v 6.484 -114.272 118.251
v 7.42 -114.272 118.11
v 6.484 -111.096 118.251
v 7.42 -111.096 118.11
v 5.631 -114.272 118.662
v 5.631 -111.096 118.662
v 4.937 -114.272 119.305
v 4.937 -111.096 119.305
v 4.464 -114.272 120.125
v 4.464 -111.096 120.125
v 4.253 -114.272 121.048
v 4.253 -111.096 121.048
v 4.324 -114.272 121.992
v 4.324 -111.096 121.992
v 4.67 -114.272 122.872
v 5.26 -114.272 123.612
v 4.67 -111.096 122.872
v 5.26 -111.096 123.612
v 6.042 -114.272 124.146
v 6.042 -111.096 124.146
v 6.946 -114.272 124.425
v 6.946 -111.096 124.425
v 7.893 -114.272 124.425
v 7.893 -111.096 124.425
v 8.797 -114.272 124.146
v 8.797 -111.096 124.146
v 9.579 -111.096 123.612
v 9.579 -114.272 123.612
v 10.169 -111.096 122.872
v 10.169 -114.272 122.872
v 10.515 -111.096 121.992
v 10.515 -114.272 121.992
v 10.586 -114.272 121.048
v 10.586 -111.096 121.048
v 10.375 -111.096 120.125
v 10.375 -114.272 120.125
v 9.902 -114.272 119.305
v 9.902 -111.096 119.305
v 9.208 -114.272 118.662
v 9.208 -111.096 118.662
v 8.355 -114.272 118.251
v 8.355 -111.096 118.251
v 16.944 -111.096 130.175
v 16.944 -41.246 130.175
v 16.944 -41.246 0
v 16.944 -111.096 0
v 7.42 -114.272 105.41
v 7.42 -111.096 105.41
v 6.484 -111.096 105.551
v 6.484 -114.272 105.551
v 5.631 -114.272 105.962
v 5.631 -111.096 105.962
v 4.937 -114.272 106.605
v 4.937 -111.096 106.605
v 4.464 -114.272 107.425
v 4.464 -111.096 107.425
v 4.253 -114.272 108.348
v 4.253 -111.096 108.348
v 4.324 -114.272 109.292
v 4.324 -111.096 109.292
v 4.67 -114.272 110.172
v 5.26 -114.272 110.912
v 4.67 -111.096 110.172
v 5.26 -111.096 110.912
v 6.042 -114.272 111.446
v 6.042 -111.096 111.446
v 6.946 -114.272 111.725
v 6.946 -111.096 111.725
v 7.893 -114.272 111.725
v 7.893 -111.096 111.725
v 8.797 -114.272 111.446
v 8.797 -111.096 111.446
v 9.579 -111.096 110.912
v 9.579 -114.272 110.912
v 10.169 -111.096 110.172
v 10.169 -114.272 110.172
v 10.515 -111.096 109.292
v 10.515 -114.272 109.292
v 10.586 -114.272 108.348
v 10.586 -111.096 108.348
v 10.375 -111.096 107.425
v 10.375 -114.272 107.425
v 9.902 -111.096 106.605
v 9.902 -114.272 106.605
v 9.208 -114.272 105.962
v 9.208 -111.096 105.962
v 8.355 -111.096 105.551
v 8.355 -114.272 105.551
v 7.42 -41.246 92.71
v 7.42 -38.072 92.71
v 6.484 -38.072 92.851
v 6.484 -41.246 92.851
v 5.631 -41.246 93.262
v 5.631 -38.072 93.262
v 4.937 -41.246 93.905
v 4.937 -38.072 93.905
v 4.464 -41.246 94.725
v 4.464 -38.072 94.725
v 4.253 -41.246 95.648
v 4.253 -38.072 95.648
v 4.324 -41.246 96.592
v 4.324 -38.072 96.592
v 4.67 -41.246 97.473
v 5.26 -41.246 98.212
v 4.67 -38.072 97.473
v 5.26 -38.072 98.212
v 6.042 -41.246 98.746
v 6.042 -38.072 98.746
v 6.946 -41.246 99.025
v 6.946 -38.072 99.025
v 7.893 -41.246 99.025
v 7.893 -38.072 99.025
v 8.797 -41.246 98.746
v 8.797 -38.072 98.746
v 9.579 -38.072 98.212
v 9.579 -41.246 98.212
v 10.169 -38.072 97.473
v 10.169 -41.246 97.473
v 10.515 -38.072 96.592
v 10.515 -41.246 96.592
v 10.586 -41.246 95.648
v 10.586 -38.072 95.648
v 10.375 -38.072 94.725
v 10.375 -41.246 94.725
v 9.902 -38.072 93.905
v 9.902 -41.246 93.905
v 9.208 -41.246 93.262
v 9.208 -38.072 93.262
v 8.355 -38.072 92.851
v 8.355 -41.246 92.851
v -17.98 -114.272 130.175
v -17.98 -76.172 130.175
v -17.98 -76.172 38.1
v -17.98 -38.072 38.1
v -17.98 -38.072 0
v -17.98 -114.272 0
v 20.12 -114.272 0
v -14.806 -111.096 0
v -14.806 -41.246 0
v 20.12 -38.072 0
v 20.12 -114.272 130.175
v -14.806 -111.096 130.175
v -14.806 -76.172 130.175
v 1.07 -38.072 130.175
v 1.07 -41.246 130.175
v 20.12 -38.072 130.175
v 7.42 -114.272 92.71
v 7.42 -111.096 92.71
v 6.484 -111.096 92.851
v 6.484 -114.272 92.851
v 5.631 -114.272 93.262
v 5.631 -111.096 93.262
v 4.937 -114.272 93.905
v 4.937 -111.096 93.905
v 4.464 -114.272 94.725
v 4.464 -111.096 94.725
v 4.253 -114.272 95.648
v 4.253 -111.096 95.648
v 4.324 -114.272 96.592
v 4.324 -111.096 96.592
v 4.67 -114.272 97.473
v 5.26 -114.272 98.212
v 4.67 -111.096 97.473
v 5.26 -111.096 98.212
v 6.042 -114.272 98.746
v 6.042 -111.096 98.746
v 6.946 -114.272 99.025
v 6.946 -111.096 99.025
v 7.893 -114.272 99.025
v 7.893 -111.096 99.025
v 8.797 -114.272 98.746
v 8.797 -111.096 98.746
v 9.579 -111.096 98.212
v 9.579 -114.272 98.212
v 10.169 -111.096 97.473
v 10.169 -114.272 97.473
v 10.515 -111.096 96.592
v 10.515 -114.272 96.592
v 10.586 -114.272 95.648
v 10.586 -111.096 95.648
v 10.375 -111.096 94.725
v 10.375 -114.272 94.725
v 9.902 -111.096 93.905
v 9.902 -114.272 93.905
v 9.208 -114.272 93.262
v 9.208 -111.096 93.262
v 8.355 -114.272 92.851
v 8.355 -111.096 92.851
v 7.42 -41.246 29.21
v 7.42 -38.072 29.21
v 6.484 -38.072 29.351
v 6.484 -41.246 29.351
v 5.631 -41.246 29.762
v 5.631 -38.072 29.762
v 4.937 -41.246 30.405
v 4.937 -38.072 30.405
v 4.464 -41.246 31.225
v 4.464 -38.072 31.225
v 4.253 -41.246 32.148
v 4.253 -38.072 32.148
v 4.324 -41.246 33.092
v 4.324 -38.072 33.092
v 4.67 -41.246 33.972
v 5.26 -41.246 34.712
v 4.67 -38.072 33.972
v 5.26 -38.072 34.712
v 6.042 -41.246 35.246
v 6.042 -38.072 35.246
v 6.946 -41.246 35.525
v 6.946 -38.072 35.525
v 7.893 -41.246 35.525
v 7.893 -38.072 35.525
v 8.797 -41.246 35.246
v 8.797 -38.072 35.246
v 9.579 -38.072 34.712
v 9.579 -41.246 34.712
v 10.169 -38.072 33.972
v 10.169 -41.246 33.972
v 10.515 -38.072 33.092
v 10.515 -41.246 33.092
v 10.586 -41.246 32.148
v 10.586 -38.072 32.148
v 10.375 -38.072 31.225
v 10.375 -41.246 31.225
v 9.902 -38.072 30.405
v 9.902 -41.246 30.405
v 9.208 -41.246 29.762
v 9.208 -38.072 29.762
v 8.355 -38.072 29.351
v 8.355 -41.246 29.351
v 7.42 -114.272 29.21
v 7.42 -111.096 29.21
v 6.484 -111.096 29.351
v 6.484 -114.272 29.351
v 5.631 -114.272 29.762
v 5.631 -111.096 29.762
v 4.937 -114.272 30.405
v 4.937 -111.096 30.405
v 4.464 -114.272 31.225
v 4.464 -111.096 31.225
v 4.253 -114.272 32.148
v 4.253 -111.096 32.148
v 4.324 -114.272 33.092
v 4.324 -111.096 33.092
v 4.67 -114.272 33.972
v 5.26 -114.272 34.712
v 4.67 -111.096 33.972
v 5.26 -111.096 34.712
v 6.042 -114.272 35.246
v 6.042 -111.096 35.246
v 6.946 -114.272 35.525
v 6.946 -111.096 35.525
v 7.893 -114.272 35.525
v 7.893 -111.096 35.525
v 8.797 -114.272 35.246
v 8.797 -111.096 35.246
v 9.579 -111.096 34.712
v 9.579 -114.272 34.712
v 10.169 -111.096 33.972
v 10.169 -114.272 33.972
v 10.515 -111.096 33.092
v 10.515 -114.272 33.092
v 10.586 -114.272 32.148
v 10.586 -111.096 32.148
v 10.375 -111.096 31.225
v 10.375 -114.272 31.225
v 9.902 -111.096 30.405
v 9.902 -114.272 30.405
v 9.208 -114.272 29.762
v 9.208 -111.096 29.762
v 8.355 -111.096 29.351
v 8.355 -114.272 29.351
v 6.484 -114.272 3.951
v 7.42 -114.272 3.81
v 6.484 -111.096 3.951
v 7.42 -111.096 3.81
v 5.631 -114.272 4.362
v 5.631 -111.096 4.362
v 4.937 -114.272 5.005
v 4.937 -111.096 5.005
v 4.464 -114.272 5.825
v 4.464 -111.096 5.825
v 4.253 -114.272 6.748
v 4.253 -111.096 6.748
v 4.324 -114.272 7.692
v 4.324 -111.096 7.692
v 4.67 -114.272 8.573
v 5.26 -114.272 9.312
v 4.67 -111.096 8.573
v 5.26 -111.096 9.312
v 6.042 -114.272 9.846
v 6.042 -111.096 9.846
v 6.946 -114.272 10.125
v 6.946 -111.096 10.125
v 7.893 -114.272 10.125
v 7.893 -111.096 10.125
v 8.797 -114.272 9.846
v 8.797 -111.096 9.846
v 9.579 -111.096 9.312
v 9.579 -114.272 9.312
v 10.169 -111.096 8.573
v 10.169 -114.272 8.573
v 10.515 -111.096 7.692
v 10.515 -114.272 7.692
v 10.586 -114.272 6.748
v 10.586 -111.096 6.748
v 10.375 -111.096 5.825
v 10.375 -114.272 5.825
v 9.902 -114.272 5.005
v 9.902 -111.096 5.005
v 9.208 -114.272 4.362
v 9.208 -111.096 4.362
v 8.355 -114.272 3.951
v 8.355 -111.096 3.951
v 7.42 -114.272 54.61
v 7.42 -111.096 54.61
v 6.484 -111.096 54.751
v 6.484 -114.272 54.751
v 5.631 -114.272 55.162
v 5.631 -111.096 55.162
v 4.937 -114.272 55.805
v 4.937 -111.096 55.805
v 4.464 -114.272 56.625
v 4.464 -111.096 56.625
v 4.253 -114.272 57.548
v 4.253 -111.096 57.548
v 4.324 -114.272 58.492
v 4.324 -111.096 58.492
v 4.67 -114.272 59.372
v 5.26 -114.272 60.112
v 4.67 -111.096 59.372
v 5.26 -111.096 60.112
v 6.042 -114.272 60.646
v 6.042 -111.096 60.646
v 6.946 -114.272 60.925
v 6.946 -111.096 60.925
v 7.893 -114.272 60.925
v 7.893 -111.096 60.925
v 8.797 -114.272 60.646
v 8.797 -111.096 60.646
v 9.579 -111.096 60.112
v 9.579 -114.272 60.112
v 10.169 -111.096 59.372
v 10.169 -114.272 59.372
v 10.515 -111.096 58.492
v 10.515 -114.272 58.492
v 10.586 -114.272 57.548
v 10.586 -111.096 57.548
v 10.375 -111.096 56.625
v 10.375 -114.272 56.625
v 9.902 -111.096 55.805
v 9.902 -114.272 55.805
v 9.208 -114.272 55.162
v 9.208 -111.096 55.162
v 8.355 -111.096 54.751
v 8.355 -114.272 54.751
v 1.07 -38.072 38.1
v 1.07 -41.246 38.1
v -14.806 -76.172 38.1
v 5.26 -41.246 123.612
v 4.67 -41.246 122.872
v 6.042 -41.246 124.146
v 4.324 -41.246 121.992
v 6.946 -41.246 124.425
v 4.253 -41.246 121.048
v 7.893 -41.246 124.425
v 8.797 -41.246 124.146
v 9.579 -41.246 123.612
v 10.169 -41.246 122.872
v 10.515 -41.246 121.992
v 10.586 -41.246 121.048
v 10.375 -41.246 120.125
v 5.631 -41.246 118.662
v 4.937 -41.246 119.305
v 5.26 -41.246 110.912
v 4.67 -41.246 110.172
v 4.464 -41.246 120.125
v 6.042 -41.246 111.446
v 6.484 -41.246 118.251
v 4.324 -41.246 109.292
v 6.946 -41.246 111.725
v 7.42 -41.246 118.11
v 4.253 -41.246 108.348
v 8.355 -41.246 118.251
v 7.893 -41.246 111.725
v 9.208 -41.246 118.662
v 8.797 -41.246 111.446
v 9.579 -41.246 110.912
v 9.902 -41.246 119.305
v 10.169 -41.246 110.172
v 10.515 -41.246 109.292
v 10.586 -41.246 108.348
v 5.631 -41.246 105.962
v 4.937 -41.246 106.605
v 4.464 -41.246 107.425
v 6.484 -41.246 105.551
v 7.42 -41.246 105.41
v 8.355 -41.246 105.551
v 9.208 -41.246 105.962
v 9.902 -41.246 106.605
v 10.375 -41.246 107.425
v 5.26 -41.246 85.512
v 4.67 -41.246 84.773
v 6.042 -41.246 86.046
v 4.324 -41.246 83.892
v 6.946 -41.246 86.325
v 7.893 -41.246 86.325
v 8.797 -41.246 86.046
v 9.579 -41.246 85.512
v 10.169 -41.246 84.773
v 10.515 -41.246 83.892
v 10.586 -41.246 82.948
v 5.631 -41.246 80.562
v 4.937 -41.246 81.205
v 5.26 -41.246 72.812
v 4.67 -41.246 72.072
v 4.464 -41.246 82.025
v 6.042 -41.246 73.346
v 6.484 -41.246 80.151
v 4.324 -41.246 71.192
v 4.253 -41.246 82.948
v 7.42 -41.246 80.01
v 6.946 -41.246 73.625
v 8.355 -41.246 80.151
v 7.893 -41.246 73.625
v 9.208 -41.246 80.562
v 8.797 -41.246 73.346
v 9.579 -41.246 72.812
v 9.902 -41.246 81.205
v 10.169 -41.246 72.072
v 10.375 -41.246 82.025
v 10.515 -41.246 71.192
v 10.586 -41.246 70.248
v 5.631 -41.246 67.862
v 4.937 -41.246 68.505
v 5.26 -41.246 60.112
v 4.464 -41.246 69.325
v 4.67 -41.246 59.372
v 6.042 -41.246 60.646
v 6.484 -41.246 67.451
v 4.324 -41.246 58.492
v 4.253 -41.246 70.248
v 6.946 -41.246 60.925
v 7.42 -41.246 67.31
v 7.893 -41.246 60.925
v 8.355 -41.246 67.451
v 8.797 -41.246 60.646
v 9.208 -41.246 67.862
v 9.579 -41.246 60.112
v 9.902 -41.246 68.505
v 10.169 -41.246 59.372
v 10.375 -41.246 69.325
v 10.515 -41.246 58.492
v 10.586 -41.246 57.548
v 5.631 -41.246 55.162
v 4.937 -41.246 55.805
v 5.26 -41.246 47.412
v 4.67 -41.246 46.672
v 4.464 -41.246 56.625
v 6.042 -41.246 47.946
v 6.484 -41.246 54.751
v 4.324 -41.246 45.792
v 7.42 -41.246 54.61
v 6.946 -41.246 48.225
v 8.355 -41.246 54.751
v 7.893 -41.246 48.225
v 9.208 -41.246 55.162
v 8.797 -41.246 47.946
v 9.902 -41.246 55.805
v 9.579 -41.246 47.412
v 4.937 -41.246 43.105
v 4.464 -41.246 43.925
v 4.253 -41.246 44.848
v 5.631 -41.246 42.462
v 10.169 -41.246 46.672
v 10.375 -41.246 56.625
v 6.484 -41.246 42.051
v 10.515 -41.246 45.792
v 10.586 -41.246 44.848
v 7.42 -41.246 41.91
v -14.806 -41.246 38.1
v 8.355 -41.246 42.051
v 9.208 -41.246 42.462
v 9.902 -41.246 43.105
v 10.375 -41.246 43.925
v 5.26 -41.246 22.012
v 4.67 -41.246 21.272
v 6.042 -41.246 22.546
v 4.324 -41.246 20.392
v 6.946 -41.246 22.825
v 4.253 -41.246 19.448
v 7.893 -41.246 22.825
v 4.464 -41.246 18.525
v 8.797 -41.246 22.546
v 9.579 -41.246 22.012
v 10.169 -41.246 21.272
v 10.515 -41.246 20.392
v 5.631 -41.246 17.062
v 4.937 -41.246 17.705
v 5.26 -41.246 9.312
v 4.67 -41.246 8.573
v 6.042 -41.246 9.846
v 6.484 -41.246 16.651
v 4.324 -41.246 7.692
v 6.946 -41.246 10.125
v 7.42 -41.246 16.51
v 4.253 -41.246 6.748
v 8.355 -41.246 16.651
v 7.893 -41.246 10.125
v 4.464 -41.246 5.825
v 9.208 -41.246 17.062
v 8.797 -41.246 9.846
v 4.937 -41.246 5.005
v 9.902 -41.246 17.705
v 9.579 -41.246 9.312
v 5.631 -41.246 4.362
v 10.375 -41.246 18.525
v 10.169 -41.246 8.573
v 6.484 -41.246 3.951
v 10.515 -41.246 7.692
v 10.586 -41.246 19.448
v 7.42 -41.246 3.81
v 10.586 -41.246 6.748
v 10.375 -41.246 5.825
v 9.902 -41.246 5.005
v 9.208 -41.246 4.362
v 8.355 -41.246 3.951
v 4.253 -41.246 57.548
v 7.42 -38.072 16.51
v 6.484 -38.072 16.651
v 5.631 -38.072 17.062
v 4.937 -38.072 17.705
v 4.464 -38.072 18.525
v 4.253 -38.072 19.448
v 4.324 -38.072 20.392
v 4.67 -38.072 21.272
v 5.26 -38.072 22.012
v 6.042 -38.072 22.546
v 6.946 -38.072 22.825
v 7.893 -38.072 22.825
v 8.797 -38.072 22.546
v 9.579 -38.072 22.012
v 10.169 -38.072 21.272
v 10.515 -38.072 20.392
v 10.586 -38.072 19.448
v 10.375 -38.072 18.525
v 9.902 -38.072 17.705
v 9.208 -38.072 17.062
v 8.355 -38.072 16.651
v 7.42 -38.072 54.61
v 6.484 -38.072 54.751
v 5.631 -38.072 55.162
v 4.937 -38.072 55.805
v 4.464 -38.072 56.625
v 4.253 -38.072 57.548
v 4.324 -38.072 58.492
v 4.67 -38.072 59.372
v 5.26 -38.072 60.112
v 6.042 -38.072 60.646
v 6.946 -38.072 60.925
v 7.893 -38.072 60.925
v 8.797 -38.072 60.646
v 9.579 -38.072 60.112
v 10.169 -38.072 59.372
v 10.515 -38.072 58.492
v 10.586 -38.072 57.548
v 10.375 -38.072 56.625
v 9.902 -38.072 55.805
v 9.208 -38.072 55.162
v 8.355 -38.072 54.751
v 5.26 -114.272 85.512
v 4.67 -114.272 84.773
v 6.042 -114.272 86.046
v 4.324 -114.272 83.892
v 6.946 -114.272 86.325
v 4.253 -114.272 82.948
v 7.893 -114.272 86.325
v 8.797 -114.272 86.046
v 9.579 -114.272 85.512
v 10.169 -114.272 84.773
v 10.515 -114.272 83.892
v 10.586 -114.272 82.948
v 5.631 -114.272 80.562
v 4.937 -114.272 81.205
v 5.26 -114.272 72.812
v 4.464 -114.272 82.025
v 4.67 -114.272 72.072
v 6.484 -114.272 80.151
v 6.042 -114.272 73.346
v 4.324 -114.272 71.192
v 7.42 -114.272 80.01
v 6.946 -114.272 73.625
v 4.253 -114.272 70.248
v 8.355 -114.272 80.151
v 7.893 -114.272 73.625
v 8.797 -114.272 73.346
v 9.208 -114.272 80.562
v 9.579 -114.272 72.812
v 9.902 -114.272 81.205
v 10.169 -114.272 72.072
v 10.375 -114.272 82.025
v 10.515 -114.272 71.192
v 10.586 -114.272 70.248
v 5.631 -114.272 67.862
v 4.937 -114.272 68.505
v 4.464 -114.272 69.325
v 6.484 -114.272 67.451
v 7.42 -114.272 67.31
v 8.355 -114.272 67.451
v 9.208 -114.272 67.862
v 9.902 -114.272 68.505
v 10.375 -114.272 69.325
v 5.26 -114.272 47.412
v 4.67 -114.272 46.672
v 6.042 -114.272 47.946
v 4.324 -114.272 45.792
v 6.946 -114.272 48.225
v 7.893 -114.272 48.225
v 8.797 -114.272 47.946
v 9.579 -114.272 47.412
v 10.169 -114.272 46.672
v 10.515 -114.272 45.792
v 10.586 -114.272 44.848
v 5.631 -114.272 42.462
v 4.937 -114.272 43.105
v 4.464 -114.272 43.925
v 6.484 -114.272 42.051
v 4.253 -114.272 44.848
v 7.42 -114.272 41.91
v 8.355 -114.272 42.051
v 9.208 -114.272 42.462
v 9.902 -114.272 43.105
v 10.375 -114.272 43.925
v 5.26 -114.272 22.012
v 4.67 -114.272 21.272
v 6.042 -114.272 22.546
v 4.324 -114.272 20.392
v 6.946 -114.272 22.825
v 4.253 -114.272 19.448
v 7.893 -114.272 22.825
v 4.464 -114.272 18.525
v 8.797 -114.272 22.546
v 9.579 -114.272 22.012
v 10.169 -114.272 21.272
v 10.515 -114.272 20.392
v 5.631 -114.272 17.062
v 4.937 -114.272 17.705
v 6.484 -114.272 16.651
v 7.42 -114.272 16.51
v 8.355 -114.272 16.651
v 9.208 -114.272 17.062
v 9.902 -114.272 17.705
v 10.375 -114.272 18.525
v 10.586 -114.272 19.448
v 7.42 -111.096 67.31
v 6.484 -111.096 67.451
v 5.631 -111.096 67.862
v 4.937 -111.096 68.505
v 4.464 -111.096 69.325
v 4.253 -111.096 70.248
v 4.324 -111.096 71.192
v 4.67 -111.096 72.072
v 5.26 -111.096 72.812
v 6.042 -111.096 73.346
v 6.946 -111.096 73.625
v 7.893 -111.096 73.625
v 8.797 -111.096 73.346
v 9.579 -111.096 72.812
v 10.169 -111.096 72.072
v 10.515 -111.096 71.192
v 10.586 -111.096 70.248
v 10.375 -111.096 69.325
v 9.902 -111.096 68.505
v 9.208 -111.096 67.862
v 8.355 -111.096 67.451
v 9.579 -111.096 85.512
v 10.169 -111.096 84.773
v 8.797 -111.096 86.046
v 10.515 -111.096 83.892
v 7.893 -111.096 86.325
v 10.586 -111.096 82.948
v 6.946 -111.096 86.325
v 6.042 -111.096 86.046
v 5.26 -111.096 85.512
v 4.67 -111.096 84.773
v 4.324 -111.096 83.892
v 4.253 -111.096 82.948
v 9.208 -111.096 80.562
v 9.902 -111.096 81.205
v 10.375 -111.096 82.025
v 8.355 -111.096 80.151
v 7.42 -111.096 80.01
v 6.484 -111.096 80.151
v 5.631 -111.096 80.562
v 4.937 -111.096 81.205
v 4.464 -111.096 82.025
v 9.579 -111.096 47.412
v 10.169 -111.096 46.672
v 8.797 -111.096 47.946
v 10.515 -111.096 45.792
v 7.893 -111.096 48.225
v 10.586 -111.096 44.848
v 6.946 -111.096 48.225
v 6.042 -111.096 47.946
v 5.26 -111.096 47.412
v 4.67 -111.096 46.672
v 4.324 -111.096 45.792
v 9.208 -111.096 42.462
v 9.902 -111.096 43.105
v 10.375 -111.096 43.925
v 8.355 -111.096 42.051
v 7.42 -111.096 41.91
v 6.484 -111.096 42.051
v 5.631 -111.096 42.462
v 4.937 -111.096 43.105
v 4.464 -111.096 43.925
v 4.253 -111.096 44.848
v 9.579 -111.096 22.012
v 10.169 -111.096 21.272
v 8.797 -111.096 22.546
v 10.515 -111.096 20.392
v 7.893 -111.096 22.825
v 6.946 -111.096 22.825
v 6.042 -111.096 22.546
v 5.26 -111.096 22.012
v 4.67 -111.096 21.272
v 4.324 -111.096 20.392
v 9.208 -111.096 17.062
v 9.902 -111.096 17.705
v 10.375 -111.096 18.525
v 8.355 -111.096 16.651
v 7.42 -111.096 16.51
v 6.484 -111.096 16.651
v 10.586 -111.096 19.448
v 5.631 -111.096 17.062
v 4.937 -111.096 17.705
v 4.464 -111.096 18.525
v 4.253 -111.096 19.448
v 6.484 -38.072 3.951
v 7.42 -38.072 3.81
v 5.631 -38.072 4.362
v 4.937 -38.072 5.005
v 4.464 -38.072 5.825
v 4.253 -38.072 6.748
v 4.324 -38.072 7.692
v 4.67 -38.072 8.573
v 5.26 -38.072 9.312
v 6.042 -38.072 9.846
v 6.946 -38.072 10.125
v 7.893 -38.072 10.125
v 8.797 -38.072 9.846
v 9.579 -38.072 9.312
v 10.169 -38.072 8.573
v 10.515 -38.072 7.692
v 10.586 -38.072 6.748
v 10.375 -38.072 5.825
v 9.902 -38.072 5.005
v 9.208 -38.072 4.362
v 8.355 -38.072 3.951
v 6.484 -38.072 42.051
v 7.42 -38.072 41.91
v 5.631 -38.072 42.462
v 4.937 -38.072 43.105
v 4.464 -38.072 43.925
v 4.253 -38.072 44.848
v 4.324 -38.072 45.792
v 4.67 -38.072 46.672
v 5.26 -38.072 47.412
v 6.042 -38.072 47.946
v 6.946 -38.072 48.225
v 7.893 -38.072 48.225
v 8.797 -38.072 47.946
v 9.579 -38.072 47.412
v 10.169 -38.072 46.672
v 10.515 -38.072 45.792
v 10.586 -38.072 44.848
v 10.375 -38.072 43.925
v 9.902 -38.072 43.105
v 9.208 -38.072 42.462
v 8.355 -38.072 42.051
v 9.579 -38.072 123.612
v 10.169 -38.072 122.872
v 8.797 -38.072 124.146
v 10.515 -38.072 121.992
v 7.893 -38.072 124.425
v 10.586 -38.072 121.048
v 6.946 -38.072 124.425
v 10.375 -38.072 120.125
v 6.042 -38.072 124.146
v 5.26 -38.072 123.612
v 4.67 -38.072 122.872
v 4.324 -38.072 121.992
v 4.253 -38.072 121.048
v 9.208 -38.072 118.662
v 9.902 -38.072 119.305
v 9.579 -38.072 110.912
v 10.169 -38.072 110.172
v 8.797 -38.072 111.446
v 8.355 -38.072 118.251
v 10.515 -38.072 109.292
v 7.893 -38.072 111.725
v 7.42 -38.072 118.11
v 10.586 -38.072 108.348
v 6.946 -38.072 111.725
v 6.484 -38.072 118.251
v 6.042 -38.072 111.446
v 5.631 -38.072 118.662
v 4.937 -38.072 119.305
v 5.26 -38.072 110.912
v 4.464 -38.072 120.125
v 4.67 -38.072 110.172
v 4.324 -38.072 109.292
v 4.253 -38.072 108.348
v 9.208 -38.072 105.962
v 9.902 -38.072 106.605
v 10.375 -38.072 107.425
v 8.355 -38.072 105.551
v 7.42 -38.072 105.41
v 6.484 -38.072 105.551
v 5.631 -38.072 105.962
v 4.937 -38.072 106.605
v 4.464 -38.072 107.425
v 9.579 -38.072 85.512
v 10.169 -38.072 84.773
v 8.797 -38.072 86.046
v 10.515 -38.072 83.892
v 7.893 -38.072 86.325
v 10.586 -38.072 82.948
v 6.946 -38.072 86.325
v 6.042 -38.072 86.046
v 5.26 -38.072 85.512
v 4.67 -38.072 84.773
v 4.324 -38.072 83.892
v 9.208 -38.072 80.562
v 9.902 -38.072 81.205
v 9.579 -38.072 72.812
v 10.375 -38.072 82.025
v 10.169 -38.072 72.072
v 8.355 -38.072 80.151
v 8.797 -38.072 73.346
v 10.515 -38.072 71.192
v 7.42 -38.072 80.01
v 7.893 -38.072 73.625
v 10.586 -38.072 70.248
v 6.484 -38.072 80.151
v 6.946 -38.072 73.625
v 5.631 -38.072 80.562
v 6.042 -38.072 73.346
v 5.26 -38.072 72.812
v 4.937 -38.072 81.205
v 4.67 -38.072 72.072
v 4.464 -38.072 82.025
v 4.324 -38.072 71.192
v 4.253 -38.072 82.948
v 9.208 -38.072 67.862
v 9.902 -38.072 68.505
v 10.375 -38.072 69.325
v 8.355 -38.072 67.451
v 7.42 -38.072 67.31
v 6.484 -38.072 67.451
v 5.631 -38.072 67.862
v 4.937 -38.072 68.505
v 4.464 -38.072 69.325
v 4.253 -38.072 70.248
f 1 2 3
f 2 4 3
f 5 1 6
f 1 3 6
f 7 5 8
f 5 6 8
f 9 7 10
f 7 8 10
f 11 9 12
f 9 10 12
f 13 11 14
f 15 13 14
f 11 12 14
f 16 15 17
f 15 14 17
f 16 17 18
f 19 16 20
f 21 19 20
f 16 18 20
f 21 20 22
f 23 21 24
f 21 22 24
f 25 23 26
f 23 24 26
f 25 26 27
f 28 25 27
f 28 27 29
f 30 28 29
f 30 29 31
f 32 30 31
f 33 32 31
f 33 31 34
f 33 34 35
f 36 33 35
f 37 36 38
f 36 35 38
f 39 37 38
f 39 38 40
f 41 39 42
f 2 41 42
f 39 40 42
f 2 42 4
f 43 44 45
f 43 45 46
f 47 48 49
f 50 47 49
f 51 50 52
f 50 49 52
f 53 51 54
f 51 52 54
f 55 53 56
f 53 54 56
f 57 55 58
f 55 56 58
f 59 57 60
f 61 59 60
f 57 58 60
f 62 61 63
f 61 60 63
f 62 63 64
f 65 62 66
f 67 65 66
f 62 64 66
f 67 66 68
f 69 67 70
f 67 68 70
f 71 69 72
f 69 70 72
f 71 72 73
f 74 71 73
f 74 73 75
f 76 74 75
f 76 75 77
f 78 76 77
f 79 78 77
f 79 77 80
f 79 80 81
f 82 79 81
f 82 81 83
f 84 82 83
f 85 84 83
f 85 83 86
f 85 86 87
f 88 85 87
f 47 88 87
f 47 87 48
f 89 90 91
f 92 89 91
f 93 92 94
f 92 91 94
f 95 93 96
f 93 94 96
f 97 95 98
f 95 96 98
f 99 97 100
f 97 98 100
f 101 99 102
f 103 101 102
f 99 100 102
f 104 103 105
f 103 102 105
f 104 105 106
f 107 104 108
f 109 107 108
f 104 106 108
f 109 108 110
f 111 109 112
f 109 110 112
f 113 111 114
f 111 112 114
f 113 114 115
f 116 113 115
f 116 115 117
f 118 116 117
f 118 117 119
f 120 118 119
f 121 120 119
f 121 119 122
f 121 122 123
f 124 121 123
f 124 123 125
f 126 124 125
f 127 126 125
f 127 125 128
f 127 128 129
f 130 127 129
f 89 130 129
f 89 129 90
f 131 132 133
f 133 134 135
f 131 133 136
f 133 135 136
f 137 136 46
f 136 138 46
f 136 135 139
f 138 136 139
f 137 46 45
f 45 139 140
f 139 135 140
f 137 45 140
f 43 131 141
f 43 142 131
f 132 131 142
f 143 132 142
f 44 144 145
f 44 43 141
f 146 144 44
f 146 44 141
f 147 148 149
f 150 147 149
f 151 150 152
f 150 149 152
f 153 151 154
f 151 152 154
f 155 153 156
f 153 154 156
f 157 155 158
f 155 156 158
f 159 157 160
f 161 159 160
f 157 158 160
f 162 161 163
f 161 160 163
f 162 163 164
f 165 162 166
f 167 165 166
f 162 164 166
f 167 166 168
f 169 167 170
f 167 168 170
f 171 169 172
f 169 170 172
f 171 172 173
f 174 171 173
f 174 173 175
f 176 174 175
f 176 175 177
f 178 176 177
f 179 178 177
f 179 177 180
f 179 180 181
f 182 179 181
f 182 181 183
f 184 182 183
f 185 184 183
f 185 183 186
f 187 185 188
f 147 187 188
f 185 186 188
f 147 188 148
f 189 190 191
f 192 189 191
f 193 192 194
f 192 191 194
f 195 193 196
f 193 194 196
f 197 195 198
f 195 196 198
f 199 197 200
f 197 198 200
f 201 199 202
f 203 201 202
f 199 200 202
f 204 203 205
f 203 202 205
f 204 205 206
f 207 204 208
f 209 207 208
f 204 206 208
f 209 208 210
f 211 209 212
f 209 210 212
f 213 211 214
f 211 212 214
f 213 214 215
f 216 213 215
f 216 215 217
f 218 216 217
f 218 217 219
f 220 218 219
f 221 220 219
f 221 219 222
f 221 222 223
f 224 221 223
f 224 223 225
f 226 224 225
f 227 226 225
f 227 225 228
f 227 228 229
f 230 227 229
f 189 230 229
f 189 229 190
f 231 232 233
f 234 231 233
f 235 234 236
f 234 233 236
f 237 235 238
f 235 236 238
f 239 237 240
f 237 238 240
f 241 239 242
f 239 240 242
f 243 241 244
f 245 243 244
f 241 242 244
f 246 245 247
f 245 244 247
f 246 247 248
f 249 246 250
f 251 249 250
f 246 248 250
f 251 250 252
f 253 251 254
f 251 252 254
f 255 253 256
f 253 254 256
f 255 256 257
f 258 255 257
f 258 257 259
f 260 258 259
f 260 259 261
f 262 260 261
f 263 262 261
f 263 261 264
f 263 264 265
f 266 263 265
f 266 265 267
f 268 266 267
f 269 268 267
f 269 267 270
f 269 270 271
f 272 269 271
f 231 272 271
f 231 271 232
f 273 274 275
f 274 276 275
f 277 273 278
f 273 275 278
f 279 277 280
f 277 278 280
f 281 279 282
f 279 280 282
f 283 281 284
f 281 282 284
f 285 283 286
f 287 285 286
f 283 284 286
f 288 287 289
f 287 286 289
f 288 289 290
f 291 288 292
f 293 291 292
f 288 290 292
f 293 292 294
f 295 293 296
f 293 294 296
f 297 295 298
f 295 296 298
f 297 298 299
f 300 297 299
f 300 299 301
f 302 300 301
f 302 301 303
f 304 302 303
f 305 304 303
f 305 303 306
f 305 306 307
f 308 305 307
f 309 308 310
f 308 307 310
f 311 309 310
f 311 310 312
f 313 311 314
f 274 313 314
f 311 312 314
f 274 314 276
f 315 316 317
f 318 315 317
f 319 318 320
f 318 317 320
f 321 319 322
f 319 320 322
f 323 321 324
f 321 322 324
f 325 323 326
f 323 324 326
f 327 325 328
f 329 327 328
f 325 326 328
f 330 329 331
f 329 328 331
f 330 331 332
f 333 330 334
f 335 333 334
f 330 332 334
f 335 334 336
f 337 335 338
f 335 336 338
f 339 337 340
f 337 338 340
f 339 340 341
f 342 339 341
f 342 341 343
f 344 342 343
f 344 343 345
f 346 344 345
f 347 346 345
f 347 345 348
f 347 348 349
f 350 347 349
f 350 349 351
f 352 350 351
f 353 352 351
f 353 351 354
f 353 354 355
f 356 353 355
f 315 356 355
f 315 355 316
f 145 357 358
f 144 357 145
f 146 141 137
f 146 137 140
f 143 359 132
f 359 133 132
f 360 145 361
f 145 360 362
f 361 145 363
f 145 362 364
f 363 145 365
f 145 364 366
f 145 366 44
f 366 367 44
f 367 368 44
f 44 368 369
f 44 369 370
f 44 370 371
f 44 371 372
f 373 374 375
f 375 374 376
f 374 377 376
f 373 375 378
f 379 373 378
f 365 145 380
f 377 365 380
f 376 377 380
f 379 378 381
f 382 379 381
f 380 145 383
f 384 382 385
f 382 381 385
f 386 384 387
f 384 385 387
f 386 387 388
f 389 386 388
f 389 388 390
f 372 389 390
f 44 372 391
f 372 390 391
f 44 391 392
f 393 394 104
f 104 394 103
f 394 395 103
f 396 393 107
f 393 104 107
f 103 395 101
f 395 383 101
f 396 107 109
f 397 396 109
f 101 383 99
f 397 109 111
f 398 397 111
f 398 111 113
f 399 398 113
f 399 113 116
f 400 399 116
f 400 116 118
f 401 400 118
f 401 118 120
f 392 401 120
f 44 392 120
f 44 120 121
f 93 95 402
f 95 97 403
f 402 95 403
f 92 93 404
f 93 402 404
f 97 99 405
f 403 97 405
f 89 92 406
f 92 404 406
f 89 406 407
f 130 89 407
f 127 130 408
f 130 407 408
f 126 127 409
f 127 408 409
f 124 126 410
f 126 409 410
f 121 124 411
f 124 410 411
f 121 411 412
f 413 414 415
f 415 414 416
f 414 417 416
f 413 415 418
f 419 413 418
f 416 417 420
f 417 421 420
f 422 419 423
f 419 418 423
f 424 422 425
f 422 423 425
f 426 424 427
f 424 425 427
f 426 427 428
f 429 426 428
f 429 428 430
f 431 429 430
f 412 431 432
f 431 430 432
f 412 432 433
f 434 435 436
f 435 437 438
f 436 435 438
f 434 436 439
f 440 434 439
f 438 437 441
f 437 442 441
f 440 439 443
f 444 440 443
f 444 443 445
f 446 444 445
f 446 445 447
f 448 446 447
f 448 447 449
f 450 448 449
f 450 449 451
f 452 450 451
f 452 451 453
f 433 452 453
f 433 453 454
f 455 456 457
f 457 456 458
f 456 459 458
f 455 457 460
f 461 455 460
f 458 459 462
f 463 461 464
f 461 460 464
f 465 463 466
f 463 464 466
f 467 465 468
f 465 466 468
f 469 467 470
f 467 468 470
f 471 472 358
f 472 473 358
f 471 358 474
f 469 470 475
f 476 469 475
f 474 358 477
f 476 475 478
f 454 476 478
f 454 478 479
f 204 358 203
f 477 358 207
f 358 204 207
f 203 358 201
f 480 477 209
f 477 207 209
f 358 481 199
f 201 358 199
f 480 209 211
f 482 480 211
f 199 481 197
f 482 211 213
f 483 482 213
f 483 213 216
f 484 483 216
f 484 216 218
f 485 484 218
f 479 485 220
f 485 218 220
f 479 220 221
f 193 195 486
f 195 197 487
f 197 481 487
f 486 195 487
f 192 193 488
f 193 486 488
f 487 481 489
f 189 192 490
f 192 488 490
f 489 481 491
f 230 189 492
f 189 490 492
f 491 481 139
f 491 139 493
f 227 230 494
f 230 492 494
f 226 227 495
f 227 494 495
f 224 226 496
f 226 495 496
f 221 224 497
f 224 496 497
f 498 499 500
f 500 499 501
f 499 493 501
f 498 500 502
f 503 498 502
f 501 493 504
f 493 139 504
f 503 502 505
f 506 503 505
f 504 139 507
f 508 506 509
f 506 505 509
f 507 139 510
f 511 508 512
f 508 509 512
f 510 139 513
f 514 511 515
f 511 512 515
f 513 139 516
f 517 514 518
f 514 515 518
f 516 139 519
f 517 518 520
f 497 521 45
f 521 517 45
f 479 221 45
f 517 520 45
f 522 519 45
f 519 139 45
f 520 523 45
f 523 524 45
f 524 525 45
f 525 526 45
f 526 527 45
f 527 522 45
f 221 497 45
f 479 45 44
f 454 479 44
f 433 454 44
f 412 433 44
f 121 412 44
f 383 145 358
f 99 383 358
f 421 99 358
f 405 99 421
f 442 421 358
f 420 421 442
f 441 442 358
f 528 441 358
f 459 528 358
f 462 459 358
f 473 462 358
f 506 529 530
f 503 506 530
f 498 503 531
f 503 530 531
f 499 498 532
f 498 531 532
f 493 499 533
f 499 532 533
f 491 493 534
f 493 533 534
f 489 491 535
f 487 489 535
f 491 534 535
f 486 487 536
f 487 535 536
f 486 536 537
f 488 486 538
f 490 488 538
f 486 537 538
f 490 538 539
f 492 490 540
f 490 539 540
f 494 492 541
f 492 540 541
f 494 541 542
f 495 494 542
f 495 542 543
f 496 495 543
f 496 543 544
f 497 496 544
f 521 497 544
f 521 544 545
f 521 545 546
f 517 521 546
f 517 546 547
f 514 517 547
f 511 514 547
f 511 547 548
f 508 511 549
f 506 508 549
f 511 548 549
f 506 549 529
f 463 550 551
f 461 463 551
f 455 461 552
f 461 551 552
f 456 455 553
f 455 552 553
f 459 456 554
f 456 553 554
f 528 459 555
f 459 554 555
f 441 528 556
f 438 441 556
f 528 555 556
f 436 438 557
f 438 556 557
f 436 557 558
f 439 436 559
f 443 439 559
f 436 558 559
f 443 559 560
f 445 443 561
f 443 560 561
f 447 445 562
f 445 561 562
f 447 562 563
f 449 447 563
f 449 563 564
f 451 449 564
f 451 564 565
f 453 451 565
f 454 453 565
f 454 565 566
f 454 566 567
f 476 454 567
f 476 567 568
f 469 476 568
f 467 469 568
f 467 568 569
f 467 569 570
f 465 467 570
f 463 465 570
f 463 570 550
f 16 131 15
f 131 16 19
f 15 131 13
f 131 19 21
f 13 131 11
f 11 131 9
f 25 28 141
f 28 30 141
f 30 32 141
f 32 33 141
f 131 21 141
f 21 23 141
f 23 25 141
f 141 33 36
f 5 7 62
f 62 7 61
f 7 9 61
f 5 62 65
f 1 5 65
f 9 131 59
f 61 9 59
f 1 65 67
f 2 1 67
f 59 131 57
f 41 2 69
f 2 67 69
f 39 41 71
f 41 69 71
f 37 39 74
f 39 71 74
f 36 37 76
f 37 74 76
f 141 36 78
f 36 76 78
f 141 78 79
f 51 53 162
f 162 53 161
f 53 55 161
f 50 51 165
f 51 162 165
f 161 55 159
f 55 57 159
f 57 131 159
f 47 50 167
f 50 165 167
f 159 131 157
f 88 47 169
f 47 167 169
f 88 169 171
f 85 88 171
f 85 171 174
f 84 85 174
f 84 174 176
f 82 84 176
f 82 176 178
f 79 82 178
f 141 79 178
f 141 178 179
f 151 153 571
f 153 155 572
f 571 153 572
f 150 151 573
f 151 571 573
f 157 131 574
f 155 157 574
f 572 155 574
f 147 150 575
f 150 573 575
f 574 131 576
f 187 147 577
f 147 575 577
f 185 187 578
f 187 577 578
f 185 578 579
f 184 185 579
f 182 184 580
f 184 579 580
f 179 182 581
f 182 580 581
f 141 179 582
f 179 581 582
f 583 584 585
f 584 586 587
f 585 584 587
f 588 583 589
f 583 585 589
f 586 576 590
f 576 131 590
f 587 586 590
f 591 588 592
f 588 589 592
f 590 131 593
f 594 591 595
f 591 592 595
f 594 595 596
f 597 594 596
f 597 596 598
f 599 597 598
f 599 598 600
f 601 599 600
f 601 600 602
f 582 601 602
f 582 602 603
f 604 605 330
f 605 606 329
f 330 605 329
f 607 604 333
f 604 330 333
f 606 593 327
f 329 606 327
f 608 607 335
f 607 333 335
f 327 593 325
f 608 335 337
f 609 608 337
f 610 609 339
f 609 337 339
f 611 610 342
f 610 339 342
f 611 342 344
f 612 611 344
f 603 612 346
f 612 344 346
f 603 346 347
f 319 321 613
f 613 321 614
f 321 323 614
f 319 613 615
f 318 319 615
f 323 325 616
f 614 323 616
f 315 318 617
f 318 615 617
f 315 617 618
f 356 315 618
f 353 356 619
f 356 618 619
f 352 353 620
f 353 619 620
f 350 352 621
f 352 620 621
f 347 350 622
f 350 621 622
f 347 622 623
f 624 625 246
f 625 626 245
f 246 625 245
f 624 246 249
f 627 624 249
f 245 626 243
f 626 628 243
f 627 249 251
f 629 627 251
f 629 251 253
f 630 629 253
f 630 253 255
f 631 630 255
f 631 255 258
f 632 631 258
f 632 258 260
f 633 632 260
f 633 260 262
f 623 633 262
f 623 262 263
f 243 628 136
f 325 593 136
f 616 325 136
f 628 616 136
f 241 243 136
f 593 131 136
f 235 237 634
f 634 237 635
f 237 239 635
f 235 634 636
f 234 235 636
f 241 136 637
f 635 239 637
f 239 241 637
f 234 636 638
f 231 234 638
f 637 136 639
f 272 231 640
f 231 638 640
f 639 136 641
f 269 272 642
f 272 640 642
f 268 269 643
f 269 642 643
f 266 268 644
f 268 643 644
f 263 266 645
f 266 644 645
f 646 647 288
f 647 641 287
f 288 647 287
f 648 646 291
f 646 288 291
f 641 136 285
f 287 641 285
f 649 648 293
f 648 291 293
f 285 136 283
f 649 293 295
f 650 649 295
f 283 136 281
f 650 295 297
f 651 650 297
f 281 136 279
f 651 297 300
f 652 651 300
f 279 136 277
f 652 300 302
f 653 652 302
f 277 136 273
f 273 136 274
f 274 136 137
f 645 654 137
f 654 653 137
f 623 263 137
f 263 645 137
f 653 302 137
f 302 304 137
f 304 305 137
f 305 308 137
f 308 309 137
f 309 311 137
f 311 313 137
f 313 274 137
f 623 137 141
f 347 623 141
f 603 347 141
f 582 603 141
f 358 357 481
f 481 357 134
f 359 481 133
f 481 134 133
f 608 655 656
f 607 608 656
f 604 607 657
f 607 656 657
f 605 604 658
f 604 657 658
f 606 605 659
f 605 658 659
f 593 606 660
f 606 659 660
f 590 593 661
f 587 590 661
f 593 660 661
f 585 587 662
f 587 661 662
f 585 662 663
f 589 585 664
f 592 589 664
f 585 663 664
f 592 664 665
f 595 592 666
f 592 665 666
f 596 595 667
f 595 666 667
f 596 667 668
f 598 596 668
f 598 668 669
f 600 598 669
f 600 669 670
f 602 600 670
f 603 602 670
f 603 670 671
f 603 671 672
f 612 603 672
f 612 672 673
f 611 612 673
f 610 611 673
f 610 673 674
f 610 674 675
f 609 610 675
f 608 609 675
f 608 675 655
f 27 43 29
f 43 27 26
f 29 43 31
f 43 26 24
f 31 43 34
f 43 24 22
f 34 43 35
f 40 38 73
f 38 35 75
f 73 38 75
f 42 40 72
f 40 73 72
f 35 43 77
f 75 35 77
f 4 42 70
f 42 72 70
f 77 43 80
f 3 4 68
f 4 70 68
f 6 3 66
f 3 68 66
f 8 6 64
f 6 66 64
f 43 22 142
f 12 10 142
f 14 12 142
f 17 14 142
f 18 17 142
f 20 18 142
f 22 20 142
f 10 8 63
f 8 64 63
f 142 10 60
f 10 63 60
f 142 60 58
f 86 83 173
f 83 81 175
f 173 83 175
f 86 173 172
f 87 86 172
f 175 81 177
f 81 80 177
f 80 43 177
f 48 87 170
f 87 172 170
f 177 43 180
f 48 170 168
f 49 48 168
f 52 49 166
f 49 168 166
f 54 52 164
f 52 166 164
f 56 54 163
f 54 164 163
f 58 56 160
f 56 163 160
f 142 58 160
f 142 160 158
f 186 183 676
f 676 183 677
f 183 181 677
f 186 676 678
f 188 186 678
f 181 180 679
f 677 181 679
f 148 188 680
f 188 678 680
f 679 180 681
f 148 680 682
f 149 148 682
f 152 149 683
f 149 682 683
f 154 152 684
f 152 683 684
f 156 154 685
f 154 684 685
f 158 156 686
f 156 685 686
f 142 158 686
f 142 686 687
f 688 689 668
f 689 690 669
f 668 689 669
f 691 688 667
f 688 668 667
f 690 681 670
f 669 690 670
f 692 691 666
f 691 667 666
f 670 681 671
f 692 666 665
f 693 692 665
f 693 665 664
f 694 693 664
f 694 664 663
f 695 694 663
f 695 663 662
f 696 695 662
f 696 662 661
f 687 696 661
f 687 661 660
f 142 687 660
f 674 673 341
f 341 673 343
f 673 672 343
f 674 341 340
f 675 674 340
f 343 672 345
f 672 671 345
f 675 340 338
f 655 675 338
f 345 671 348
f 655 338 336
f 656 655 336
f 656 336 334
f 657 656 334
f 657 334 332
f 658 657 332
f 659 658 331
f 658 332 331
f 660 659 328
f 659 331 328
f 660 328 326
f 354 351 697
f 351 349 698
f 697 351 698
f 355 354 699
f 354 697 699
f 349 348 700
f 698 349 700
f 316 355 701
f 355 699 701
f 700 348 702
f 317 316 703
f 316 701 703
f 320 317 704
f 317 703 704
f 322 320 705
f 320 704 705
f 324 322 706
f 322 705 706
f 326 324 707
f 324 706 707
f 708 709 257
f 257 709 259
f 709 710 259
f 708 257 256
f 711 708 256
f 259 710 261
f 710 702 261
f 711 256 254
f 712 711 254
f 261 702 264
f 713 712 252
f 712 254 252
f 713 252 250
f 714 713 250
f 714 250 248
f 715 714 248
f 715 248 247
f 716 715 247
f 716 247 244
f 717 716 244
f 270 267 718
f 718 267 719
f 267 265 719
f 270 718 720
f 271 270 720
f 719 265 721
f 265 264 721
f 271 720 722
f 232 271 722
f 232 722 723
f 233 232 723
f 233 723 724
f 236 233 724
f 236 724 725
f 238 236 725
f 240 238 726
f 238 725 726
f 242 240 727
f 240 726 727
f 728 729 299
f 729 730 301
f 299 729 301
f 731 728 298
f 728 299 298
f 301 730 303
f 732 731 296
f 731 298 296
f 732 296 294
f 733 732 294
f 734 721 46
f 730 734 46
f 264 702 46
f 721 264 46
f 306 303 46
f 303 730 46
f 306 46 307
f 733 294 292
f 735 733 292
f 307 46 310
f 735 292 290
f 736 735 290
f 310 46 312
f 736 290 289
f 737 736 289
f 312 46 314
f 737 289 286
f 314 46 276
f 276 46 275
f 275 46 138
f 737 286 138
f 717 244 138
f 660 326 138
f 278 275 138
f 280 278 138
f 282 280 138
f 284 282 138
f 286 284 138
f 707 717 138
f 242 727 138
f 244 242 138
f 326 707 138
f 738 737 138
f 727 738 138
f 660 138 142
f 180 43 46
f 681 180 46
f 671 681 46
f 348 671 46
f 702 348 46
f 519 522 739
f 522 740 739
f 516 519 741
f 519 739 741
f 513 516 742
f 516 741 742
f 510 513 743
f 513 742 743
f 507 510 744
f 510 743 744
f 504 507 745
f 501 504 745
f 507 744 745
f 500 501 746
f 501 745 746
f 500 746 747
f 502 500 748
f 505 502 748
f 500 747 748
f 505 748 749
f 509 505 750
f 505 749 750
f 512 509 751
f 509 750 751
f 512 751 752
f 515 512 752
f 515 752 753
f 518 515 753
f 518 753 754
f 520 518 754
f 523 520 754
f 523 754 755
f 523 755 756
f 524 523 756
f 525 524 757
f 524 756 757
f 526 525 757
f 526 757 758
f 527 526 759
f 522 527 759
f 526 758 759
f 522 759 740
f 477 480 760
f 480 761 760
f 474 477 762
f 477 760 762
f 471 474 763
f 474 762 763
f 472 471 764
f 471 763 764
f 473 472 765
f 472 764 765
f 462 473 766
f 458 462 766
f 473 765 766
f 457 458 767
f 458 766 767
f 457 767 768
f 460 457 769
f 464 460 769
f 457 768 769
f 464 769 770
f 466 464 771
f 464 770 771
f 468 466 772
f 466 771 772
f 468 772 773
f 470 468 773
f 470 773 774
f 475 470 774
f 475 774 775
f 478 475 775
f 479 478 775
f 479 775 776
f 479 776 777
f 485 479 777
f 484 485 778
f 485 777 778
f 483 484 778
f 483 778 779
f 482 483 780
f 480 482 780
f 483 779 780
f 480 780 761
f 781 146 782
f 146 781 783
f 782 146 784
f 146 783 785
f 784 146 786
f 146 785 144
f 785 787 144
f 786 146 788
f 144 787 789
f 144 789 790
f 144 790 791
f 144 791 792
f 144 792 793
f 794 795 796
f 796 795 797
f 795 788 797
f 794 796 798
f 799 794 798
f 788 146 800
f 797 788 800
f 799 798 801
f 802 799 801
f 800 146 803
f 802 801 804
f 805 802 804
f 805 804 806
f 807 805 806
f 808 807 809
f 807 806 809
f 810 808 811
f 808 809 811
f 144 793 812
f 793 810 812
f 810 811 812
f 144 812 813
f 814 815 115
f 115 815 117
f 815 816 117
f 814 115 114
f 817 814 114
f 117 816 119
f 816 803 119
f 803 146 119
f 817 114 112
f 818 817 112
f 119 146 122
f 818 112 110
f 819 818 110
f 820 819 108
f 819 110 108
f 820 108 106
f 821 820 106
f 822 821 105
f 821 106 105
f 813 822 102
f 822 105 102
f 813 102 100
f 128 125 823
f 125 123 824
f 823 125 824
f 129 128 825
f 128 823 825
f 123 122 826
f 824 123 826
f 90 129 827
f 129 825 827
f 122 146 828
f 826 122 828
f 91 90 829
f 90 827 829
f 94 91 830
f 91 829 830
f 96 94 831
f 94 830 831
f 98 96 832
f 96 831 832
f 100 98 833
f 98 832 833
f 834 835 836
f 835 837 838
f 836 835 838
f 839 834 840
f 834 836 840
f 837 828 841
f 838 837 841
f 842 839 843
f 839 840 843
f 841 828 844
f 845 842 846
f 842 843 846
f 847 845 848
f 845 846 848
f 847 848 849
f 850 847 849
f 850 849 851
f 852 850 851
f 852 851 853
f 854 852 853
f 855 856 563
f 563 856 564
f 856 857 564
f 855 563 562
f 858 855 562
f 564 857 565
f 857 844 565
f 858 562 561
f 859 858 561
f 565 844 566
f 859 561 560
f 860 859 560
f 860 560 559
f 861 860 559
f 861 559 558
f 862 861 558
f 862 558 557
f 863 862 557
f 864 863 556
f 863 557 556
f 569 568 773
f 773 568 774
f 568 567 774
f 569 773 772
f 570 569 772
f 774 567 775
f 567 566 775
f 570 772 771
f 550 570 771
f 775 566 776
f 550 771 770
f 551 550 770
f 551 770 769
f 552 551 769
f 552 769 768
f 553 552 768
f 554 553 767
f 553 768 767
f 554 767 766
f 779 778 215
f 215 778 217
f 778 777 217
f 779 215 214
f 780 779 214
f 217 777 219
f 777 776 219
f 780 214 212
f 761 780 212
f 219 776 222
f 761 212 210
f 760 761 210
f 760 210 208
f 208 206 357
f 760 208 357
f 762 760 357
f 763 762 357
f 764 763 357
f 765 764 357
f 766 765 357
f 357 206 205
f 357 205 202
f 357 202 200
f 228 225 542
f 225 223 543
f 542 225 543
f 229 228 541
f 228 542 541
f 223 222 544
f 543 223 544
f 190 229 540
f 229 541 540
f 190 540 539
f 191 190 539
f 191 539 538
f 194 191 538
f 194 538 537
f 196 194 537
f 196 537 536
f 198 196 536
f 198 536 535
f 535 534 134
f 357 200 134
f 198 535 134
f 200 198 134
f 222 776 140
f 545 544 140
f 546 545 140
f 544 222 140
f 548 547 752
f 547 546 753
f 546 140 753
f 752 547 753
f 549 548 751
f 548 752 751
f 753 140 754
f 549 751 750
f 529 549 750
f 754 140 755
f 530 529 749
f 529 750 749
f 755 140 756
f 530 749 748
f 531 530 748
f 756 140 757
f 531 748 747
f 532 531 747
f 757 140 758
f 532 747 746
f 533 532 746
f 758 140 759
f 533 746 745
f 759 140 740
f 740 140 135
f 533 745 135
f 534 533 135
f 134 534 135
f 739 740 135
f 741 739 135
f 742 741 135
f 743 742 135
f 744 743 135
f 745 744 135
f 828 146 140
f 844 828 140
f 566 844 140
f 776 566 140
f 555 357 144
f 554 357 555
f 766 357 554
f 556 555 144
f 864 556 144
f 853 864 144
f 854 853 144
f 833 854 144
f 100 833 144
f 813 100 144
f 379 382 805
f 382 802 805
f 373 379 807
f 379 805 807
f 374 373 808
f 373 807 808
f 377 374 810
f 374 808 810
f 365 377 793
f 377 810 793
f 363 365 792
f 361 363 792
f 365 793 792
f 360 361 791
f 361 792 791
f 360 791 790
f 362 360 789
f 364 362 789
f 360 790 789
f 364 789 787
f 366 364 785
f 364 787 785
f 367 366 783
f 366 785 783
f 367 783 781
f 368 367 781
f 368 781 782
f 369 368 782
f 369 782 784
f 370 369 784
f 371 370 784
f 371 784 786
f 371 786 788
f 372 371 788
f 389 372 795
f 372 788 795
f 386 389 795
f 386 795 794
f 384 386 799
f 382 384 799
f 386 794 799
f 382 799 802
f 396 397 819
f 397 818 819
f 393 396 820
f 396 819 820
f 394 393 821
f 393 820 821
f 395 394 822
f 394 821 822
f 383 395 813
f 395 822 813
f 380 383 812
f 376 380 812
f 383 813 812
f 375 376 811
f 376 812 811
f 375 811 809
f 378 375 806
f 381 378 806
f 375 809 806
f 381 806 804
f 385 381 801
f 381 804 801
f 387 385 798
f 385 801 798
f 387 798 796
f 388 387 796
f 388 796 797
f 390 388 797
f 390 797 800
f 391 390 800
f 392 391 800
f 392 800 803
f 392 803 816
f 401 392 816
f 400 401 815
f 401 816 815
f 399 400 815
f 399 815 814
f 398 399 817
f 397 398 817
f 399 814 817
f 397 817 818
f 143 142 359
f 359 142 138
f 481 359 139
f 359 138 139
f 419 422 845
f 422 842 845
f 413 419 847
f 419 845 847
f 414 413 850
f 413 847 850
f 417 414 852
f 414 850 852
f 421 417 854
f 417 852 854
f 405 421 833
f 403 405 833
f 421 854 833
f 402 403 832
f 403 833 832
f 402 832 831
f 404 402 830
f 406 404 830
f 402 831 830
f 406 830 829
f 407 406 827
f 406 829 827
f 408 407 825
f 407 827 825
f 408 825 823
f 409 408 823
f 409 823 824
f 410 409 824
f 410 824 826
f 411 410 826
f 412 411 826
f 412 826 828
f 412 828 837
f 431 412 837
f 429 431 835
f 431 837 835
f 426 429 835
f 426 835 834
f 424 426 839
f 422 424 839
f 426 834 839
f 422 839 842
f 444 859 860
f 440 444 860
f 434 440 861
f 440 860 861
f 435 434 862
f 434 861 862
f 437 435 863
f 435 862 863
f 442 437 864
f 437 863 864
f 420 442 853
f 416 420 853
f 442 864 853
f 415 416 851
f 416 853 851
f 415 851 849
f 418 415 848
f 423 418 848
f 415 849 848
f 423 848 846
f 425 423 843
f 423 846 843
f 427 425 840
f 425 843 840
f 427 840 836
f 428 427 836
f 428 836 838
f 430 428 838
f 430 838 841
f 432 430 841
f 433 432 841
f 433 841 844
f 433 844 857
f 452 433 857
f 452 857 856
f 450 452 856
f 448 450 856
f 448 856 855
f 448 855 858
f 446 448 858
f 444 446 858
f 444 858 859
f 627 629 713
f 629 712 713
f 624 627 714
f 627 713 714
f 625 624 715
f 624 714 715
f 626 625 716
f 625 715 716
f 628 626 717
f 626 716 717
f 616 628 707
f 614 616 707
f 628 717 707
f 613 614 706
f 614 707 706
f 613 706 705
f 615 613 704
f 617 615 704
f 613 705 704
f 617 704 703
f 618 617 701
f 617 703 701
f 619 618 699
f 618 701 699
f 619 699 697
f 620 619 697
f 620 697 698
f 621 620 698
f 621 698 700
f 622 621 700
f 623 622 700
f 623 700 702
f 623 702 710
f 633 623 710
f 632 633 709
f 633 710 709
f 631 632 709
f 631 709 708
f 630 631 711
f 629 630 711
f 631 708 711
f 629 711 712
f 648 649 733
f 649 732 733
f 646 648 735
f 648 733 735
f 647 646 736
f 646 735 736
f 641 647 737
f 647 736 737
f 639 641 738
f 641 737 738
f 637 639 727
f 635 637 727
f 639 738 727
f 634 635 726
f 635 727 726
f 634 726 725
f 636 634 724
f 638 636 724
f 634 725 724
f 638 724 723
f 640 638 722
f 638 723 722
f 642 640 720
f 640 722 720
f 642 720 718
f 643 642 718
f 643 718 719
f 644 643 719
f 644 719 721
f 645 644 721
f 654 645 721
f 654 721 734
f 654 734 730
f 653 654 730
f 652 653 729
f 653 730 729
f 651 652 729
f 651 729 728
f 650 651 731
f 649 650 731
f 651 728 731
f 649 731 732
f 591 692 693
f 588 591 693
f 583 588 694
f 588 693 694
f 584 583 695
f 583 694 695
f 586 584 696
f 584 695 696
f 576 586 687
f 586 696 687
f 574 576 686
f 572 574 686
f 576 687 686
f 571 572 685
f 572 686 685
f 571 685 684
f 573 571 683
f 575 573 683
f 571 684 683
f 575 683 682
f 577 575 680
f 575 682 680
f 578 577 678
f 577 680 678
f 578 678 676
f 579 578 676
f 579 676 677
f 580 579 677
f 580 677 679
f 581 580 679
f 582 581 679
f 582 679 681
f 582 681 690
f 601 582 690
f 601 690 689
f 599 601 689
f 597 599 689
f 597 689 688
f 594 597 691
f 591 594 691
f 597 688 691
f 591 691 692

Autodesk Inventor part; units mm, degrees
ref_plane "YZ Plane" through (0, 0, 0) normal (1, 0, 0) x (0, 1, 0)
ref_plane "XZ Plane" through (0, 0, 0) normal (0, 1, 0) x (-1, 0, 0)
ref_plane "XY Plane" through (0, 0, 0) normal (0, 0, 1) x (1, 0, 0)
sketch "Sketch1" plane through (0, 0, 0) normal (0, 0, 1) x (1, 0, 0)
  line L0 (20.1195, -38.0715) -> (-17.9805, -38.0715)
  line L1 (-17.9805, -38.0715) -> (-17.9805, -114.2715)
  line L2 (-17.9805, -114.2715) -> (20.1195, -114.2715)
  line L3 (20.1195, -114.2715) -> (20.1195, -38.0715)
  line L4 (16.9445, -111.0965) -> (-14.8055, -111.0965)
  line L5 (-14.8055, -111.0965) -> (-14.8055, -41.2465)
  line L6 (-14.8055, -41.2465) -> (16.9445, -41.2465)
  line L7 (16.9445, -41.2465) -> (16.9445, -111.0965)
  point P0 (0, 0)
  dimension "d0" = 76.2
  dimension "d1" = 38.1
  dimension "d2" = 3.175
extrude "Extrusion1" add sketch "Sketch1" along normal blind 130.175
sketch "Sketch2" plane through (-17.9805, -114.2715, 0) normal (-1, 0, 0) x (0, 0, 1)
  line L0 (0, 76.2) -> (130.175, 76.2) projected
  line L1 (0, 76.2) -> (0, 0) projected
  line L2 (0, 0) -> (130.175, 0) projected
  line L3 (130.175, 76.2) -> (130.175, 0) projected
  line L4 (130.175, 76.2) -> (38.1, 76.2)
  line L5 (38.1, 76.2) -> (38.1, 38.1)
  line L6 (38.1, 38.1) -> (130.175, 38.1)
  line L7 (130.175, 38.1) -> (130.175, 76.2)
  point P0 (0, 114.2715)
  dimension "d25" = 38.1
  dimension "d26" = 38.1
extrude "Extrusion2" cut sketch "Sketch2" against normal blind 19.05 contours L0 L3 L6 L5
sketch "Sketch3" plane through (-17.9805, -114.2715, 0) normal (0, -1, 0) x (1, 0, 0)
  line L0 (38.1, 0) -> (38.1, 130.175) projected
  line L1 (0, 130.175) -> (38.1, 130.175) projected
  point P0 (17.9805, 0)
  point P1 (25.4, 121.285)
  point P2 (25.4, 108.585)
  point P3 (25.4, 95.885)
  point P4 (25.4, 83.185)
  point P5 (25.4, 70.485)
  point P6 (25.4, 57.785)
  point P7 (25.4, 45.085)
  point P8 (25.4, 32.385)
  point P9 (25.4, 19.685)
  point P10 (25.4, 6.985)
  dimension "d9" = 12.7
  dimension "d10" = 8.89
  dimension "d13" = 12.7
hole "Hole1" at (7.4195, -114.2715, 121.285) at (7.4195, -114.2715, 108.585) at (7.4195, -114.2715, 95.885) at (7.4195, -114.2715, 83.185) at (7.4195, -114.2715, 70.485) at (7.4195, -114.2715, 57.785) at (7.4195, -114.2715, 45.085) at (7.4195, -114.2715, 32.385) at (7.4195, -114.2715, 19.685) at (7.4195, -114.2715, 6.985) direction (0, 1, 0) diameter 6.35 end through all
properties part number "2018 Scissor Stand Off Outside A"
